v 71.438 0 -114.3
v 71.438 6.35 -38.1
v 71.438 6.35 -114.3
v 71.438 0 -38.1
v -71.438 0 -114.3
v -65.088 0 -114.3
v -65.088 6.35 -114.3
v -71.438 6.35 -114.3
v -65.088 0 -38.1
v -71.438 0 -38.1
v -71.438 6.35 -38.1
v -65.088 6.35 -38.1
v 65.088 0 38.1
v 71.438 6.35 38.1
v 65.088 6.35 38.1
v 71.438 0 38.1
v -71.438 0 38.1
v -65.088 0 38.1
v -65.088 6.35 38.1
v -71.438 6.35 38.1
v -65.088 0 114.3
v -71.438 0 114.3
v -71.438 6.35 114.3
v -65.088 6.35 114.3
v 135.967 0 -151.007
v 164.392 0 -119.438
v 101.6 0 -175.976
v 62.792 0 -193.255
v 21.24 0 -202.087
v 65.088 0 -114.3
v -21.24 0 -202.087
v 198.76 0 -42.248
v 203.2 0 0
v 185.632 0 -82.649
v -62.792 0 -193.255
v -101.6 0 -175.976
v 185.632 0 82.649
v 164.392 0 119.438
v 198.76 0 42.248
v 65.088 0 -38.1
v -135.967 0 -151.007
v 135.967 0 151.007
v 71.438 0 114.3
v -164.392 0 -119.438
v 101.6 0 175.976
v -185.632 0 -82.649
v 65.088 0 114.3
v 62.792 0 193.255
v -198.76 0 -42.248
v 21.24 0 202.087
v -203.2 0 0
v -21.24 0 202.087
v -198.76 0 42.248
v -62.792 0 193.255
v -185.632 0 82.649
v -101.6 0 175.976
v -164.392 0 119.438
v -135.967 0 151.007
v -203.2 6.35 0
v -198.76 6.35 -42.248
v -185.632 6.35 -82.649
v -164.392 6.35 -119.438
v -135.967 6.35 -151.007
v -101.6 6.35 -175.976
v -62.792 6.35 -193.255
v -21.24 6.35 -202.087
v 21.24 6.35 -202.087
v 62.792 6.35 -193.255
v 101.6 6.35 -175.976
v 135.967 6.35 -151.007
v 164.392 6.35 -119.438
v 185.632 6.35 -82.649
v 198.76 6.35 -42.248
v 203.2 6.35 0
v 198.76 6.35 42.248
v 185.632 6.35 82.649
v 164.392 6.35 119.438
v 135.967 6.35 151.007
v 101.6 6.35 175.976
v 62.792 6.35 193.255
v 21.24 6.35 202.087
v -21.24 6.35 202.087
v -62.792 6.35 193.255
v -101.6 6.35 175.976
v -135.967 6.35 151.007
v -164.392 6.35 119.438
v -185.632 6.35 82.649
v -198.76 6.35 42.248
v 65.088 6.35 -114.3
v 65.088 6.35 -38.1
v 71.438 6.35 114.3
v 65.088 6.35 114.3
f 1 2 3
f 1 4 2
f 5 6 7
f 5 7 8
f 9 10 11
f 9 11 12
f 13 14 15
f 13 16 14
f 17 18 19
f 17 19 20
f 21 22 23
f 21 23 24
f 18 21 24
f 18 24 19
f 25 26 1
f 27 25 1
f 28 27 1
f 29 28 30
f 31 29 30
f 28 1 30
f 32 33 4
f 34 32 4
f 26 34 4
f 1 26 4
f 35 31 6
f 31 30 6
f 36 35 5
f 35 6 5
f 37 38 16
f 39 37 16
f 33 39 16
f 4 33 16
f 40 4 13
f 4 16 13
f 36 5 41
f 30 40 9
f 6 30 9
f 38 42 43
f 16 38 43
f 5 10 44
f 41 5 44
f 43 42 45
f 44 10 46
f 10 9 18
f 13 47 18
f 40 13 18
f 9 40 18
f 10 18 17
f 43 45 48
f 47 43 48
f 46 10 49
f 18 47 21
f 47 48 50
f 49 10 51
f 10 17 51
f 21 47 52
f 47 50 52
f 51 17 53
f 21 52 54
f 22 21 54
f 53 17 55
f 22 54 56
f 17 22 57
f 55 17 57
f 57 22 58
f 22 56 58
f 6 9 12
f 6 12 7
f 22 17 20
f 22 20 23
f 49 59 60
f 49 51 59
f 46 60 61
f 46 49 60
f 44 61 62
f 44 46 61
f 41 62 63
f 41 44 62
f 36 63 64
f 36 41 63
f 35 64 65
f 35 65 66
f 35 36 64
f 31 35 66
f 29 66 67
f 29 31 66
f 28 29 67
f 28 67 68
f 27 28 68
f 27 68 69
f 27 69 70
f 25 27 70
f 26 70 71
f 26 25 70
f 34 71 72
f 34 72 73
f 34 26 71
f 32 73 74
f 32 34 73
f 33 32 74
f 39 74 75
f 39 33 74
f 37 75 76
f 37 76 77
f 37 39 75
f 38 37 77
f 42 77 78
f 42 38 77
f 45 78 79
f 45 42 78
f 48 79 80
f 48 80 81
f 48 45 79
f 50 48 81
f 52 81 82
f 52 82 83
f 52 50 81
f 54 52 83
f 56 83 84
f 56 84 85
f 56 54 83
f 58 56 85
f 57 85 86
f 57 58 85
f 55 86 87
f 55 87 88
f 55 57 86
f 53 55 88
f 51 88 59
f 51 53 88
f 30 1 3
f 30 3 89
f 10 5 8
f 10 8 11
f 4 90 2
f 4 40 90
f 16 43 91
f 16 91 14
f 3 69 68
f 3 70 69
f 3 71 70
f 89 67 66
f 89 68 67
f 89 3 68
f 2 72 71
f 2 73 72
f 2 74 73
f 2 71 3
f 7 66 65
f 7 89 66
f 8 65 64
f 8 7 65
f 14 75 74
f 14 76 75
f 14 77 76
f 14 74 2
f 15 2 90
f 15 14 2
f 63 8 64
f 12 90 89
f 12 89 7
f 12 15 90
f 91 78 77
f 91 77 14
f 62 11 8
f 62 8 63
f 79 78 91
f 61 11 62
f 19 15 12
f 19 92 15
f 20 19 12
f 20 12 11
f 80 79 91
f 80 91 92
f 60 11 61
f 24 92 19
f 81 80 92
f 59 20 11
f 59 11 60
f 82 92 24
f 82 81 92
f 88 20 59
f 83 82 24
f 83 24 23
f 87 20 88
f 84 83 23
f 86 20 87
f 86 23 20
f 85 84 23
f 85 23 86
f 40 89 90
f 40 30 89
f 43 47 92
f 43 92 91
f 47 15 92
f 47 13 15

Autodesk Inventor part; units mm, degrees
ref_plane "YZ Plane" through (0, 0, 0) normal (1, 0, 0) x (0, 1, 0)
ref_plane "XZ Plane" through (0, 0, 0) normal (0, 1, 0) x (-1, 0, 0)
ref_plane "XY Plane" through (0, 0, 0) normal (0, 0, 1) x (1, 0, 0)
sketch "Sketch1" plane through (0, 0, 0) normal (0, 1, 0) x (-1, 0, 0)
  circle A0 centre (0, 0) radius 203.2
  line L0 (71.4375, -38.1) -> (65.0875, -38.1)
  line L1 (65.0875, -38.1) -> (65.0875, -114.3)
  line L2 (65.0875, -114.3) -> (71.4375, -114.3)
  line L3 (71.4375, -114.3) -> (71.4375, -38.1)
  line L4 (71.4375, -38.1) -> (65.0875, -114.3) construction
  line L5 (65.0875, -38.1) -> (71.4375, -114.3) construction
  line L6 (71.4375, 114.3) -> (65.0875, 114.3)
  line L7 (65.0875, 114.3) -> (65.0875, 38.1)
  line L8 (65.0875, 38.1) -> (71.4375, 38.1)
  line L9 (71.4375, 38.1) -> (71.4375, 114.3)
  line L10 (71.4375, 114.3) -> (65.0875, 38.1) construction
  line L11 (65.0875, 114.3) -> (71.4375, 38.1) construction
  line L12 (-65.0875, -38.1) -> (-71.4375, -38.1)
  line L13 (-71.4375, -38.1) -> (-71.4375, -114.3)
  line L14 (-71.4375, -114.3) -> (-65.0875, -114.3)
  line L15 (-65.0875, -114.3) -> (-65.0875, -38.1)
  line L16 (-65.0875, -38.1) -> (-71.4375, -114.3) construction
  line L17 (-71.4375, -38.1) -> (-65.0875, -114.3) construction
  line L18 (-65.0875, 114.3) -> (-71.4375, 114.3)
  line L19 (-71.4375, 114.3) -> (-71.4375, 38.1)
  line L20 (-71.4375, 38.1) -> (-65.0875, 38.1)
  line L21 (-65.0875, 38.1) -> (-65.0875, 114.3)
  line L22 (-65.0875, 114.3) -> (-71.4375, 38.1) construction
  line L23 (-71.4375, 114.3) -> (-65.0875, 38.1) construction
  line L24 (0, -284.48) -> (0, 284.48) projected
  line L25 (-284.48, 0) -> (284.48, 0) projected
  point P0 (68.2625, -76.2)
  point P1 (68.2625, 76.2)
  point P2 (-68.2625, -76.2)
  point P3 (-68.2625, 76.2)
  dimension "d0" = 406.4
  dimension "d1" = 6.35
  dimension "d2" = 6.35
  dimension "d3" = 76.2
  dimension "d4" = 6.35
  dimension "d5" = 6.35
  dimension "d6" = 76.2
  dimension "d7" = 76.2
  dimension "d8" = 76.2
  dimension "d9" = 152.4
  dimension "d10" = 152.4
extrude "Extrusion1" add sketch "Sketch1" along normal blind 6.35
properties part number "turretBasePlate"
